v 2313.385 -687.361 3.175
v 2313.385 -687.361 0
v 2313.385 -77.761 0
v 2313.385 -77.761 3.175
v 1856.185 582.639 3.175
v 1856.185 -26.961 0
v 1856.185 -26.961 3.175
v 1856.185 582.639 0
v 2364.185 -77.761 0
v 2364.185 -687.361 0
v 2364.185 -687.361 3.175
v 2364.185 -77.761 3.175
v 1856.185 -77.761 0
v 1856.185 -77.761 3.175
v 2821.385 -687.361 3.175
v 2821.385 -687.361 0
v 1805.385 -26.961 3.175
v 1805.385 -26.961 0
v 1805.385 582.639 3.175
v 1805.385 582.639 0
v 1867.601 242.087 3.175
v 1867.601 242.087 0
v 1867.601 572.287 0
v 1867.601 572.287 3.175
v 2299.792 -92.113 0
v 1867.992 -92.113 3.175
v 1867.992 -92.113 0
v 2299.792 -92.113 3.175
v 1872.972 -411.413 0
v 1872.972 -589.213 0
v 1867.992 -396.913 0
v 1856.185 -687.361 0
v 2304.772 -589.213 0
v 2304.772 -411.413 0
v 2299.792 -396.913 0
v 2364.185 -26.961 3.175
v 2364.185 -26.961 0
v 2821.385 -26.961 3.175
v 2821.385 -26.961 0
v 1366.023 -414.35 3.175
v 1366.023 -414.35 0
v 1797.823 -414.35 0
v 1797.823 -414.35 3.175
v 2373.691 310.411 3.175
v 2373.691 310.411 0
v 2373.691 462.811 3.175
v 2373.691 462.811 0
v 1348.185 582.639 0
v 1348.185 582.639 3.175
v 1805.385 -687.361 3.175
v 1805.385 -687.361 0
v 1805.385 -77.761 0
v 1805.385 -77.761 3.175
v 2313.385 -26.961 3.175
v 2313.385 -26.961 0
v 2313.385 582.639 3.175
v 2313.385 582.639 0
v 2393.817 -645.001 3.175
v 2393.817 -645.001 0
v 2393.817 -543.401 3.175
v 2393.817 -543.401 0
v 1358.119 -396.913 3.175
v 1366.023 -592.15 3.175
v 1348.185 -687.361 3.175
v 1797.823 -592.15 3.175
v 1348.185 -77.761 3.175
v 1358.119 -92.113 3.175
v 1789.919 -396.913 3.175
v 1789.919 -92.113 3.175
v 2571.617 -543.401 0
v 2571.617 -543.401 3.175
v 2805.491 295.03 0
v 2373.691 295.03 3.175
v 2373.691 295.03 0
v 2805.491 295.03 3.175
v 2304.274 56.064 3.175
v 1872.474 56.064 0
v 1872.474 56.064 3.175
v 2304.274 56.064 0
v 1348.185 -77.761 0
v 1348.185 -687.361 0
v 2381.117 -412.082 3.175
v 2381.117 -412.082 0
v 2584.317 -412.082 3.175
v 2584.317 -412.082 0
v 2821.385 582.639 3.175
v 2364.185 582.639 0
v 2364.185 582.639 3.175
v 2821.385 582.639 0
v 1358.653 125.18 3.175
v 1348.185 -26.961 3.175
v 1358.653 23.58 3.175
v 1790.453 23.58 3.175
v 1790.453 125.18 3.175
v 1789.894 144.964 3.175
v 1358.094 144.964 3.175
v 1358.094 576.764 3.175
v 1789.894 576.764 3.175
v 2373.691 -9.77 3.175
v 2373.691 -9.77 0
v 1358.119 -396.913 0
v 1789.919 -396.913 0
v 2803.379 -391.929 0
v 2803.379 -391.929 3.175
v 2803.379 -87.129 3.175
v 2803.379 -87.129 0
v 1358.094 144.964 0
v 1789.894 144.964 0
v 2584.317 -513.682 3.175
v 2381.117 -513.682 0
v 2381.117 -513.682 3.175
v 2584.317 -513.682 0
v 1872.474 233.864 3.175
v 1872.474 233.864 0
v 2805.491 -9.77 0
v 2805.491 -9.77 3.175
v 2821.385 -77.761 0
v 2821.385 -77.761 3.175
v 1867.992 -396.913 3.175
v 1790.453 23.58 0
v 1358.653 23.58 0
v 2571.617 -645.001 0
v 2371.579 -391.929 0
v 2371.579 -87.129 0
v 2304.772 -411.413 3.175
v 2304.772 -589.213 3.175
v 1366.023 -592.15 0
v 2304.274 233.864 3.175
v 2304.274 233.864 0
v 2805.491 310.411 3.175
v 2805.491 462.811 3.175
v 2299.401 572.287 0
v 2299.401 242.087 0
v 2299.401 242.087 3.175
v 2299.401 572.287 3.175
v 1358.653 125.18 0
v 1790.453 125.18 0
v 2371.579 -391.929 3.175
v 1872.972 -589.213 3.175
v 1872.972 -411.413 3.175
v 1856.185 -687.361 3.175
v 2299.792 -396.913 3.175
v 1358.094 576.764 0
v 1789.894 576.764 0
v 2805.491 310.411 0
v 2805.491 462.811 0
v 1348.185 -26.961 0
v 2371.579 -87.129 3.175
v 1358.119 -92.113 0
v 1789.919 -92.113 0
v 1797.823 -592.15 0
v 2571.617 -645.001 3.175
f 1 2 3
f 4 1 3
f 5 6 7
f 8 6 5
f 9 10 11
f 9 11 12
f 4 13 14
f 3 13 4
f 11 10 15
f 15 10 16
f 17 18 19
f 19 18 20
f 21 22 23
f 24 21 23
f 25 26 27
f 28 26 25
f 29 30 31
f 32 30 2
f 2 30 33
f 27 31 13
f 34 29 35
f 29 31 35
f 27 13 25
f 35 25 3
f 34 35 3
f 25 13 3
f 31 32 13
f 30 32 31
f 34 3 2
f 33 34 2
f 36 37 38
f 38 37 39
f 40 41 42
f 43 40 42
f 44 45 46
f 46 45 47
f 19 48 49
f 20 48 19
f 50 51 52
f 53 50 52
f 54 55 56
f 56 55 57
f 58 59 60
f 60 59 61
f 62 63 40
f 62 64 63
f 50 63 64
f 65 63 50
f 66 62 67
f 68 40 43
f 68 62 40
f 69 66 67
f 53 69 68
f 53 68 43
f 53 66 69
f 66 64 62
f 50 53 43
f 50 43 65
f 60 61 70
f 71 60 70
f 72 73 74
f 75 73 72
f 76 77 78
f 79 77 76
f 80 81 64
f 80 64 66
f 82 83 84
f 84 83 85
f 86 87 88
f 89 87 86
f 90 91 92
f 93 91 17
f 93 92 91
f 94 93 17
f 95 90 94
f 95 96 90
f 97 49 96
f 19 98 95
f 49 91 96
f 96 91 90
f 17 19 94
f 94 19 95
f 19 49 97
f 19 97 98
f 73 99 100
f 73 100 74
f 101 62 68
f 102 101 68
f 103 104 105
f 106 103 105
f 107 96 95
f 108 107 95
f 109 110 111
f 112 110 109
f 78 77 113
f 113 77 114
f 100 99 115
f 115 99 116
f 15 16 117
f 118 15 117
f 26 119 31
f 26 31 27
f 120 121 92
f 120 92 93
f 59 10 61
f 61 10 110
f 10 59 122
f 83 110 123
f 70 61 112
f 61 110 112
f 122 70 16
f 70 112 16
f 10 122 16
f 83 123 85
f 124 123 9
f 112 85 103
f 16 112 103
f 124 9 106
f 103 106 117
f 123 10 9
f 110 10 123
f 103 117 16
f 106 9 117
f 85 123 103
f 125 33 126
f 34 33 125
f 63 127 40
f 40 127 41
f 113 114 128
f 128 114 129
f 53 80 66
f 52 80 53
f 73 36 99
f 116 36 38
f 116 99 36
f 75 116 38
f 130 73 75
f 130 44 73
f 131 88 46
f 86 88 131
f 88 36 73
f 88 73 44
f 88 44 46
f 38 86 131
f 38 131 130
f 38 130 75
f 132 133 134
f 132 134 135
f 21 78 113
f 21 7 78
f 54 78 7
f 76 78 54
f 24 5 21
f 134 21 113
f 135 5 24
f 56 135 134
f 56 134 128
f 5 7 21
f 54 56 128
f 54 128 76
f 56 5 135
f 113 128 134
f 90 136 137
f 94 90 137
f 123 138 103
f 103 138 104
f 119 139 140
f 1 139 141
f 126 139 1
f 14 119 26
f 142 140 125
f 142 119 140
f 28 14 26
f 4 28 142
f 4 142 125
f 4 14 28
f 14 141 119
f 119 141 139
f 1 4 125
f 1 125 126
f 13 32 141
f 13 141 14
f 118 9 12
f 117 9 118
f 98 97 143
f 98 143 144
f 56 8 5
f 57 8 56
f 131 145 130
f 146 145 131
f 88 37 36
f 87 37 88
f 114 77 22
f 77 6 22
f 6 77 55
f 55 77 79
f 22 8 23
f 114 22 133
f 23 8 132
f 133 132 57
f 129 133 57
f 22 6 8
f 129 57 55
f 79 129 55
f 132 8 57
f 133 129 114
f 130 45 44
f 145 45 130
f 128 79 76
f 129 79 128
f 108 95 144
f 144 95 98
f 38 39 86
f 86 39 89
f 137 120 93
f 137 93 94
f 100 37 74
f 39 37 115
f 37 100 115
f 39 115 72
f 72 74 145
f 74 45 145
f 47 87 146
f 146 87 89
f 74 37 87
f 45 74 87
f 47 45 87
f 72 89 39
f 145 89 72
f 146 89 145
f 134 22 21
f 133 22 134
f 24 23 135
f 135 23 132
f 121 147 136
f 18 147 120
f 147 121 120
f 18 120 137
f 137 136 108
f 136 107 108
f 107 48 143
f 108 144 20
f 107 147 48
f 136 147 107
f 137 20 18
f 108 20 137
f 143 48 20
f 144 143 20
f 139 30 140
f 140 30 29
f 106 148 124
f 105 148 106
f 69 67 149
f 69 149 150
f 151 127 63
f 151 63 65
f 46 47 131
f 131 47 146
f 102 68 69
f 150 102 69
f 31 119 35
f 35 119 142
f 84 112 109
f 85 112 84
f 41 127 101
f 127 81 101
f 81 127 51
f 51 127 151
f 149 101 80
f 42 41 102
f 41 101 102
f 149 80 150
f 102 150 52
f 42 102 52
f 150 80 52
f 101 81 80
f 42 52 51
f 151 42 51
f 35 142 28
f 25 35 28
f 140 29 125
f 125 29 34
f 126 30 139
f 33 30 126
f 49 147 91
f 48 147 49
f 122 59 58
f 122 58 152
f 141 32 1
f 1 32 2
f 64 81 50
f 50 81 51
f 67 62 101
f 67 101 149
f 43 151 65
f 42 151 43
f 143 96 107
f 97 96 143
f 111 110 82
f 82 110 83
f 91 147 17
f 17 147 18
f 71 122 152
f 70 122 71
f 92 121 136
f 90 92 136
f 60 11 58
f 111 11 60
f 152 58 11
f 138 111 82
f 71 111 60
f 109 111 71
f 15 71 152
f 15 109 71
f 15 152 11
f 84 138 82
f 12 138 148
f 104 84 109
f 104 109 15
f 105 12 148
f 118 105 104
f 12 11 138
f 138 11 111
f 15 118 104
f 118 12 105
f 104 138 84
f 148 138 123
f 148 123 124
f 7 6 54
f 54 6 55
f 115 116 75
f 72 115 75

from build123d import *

# Parameters (mm, degrees)
SKETCH11_W                  = 457.2
SKETCH11_H                  = 609.6
BOSS_EXTRUDE1_DEPTH         = 3.175
BOSS_EXTRUDE1_2_DEPTH       = 3.175
BOSS_EXTRUDE1_3_DEPTH       = 3.175
BOSS_EXTRUDE1_4_DEPTH       = 3.175
BOSS_EXTRUDE1_5_DEPTH       = 3.175
BOSS_EXTRUDE1_6_DEPTH       = 3.175
FOLDER_INTER_WALLS_17X12_W  = 431.8
FOLDER_INTER_WALLS_17X12_H  = 304.8
CUT_EXTRUDE2_DEPTH          = 4.175
CUT_EXTRUDE2_DEPTH_BACK     = 1
BASE_PLATE_17X17_W          = 431.8
BASE_PLATE_17X17_H          = 431.8
CUT_EXTRUDE3_DEPTH          = 1
CUT_EXTRUDE3_DEPTH_BACK     = 4.175
TOP_BASE_LAYER_17X13_W      = 431.8
TOP_BASE_LAYER_17X13_H      = 330.2
CUT_EXTRUDE4_DEPTH          = 4.175
CUT_EXTRUDE4_DEPTH_BACK     = 1
BACK_WALL_17X4_W            = 431.8
BACK_WALL_17X4_H            = 101.6
CUT_EXTRUDE5_DEPTH          = 4.175
CUT_EXTRUDE5_DEPTH_BACK     = 1
ANGLED_FOLDER_WALL_2_17X7_W = 431.8
ANGLED_FOLDER_WALL_2_17X7_H = 177.8
CUT_EXTRUDE6_DEPTH          = 4.175
CUT_EXTRUDE6_DEPTH_BACK     = 1
FRONT_WALL_17X6_W           = 431.8
FRONT_WALL_17X6_H           = 152.4
CUT_EXTRUDE7_DEPTH          = 4.175
CUT_EXTRUDE7_DEPTH_BACK     = 1
LEFT_WALL_16X8_W            = 431.8
LEFT_WALL_16X8_H            = 177.8
CUT_EXTRUDE8_DEPTH          = 4.175
CUT_EXTRUDE8_DEPTH_BACK     = 1
RIGHT_WALL_12X8_W           = 431.8
RIGHT_WALL_12X8_H           = 177.8
CUT_EXTRUDE9_DEPTH          = 4.175
CUT_EXTRUDE9_DEPTH_BACK     = 1
ANGLED_FOLDER_WALL_3_8X4_W  = 203.2
ANGLED_FOLDER_WALL_3_8X4_H  = 101.6
CUT_EXTRUDE10_DEPTH         = 4.175
CUT_EXTRUDE10_DEPTH_BACK    = 1
ANGLED_FOLDER_WALL_1_7X4_W  = 177.8
ANGLED_FOLDER_WALL_1_7X4_H  = 101.6
CUT_EXTRUDE11_DEPTH         = 4.175
CUT_EXTRUDE11_DEPTH_BACK    = 1


with BuildPart() as part:
    # Sketch11 → Boss-Extrude1 (new body)
    with BuildSketch(Plane.XY):
        with Locations((2084.784911615, 277.838906703)):
            Rectangle(SKETCH11_W, SKETCH11_H)
    extrude(amount=BOSS_EXTRUDE1_DEPTH)

    # Top Base Layer, 17x13 → Cut-Extrude4 (cut, two sides)
    with BuildSketch(Plane.XY) as cut_extrude4_sk:
        with Locations((2083.501187973, 407.186637429)):
            Rectangle(TOP_BASE_LAYER_17X13_W, TOP_BASE_LAYER_17X13_H)
    extrude(amount=CUT_EXTRUDE4_DEPTH, mode=Mode.SUBTRACT)
    extrude(cut_extrude4_sk.sketch, amount=-CUT_EXTRUDE4_DEPTH_BACK, mode=Mode.SUBTRACT)

    # Angled Folder Wall 2, 17x7 → Cut-Extrude6 (cut, two sides)
    with BuildSketch(Plane.XY) as cut_extrude6_sk:
        with Locations((2088.373542002, 144.96438064)):
            Rectangle(ANGLED_FOLDER_WALL_2_17X7_W, ANGLED_FOLDER_WALL_2_17X7_H)
    extrude(amount=CUT_EXTRUDE6_DEPTH, mode=Mode.SUBTRACT)
    extrude(cut_extrude6_sk.sketch, amount=-CUT_EXTRUDE6_DEPTH_BACK, mode=Mode.SUBTRACT)


with BuildPart() as body_2:
    # Sketch11 → Boss-Extrude1 2 (new body)
    with BuildSketch(Plane.XY):
        with Locations((1576.784911615, 277.838906703)):
            Rectangle(SKETCH11_W, SKETCH11_H)
    extrude(amount=BOSS_EXTRUDE1_2_DEPTH)

    # Base Plate, 17x17 → Cut-Extrude3 (cut, two sides)
    with BuildSketch(Plane.XY.offset(3.175)) as cut_extrude3_sk:
        with Locations((1573.993628053, 360.86438064)):
            Rectangle(BASE_PLATE_17X17_W, BASE_PLATE_17X17_H)
    extrude(amount=CUT_EXTRUDE3_DEPTH, mode=Mode.SUBTRACT)
    extrude(cut_extrude3_sk.sketch, amount=-CUT_EXTRUDE3_DEPTH_BACK, mode=Mode.SUBTRACT)

    # Back Wall, 17x4 → Cut-Extrude5 (cut, two sides)
    with BuildSketch(Plane.XY) as cut_extrude5_sk:
        with Locations((1574.552650393, 74.379666893)):
            Rectangle(BACK_WALL_17X4_W, BACK_WALL_17X4_H)
    extrude(amount=CUT_EXTRUDE5_DEPTH, mode=Mode.SUBTRACT)
    extrude(cut_extrude5_sk.sketch, amount=-CUT_EXTRUDE5_DEPTH_BACK, mode=Mode.SUBTRACT)


with BuildPart() as body_3:
    # Sketch11 → Boss-Extrude1 3 (new body)
    with BuildSketch(Plane.XY):
        with Locations((2592.784911615, 277.838906703)):
            Rectangle(SKETCH11_W, SKETCH11_H)
    extrude(amount=BOSS_EXTRUDE1_3_DEPTH)


with BuildPart() as body_4:
    # Sketch11 → Boss-Extrude1 4 (new body)
    with BuildSketch(Plane.XY):
        with Locations((2084.784911615, -382.561093297)):
            Rectangle(SKETCH11_W, SKETCH11_H)
    extrude(amount=BOSS_EXTRUDE1_4_DEPTH)


with BuildPart() as body_5:
    # Sketch11 → Boss-Extrude1 5 (new body)
    with BuildSketch(Plane.XY):
        with Locations((2592.784911615, -382.561093297)):
            Rectangle(SKETCH11_W, SKETCH11_H)
    extrude(amount=BOSS_EXTRUDE1_5_DEPTH)


with BuildPart() as body_6:
    # Sketch11 → Boss-Extrude1 6 (new body)
    with BuildSketch(Plane.XY):
        with Locations((1576.784911615, -382.561093297)):
            Rectangle(SKETCH11_W, SKETCH11_H)
    extrude(amount=BOSS_EXTRUDE1_6_DEPTH)


with BuildPart() as cut_extrude2_tool:
    # Folder Inter Walls, 17x12 → Cut-Extrude2 (new body, two sides)
    with BuildSketch(Plane.XY) as cut_extrude2_sk:
        with Locations((2587.479266915, -239.528871664)):
            Rectangle(FOLDER_INTER_WALLS_17X12_W, FOLDER_INTER_WALLS_17X12_H)
        with Locations((2589.59064321, 142.630237721)):
            Rectangle(FOLDER_INTER_WALLS_17X12_W, FOLDER_INTER_WALLS_17X12_H)
        with Locations((1574.01864534, -244.513437782)):
            Rectangle(FOLDER_INTER_WALLS_17X12_W, FOLDER_INTER_WALLS_17X12_H)
        with Locations((2083.892472887, -244.513437782)):
            Rectangle(FOLDER_INTER_WALLS_17X12_W, FOLDER_INTER_WALLS_17X12_H)
    extrude(amount=CUT_EXTRUDE2_DEPTH)
    extrude(cut_extrude2_sk.sketch, amount=-CUT_EXTRUDE2_DEPTH_BACK)


with BuildPart() as body_3_1:
    add(body_3.part)

    # Cut-Extrude2: cut by cut_extrude2_tool
    add(cut_extrude2_tool.part, mode=Mode.SUBTRACT)

    # Front Wall, 17x6 → Cut-Extrude7 (cut, two sides)
    with BuildSketch(Plane.XY) as cut_extrude7_sk:
        with Locations((2589.59064321, 386.611241092)):
            Rectangle(FRONT_WALL_17X6_W, FRONT_WALL_17X6_H)
    extrude(amount=CUT_EXTRUDE7_DEPTH, mode=Mode.SUBTRACT)
    extrude(cut_extrude7_sk.sketch, amount=-CUT_EXTRUDE7_DEPTH_BACK, mode=Mode.SUBTRACT)


with BuildPart() as body_4_1:
    add(body_4.part)

    # Cut-Extrude2: cut by cut_extrude2_tool
    add(cut_extrude2_tool.part, mode=Mode.SUBTRACT)

    # Right wall, 12x8 → Cut-Extrude9 (cut, two sides)
    with BuildSketch(Plane.XY) as cut_extrude9_sk:
        with Locations((2088.87186834, -500.312959525)):
            Rectangle(RIGHT_WALL_12X8_W, RIGHT_WALL_12X8_H)
    extrude(amount=CUT_EXTRUDE9_DEPTH, mode=Mode.SUBTRACT)
    extrude(cut_extrude9_sk.sketch, amount=-CUT_EXTRUDE9_DEPTH_BACK, mode=Mode.SUBTRACT)


with BuildPart() as body_5_1:
    add(body_5.part)

    # Cut-Extrude2: cut by cut_extrude2_tool
    add(cut_extrude2_tool.part, mode=Mode.SUBTRACT)

    # Angled Folder Wall 3, 8x4 → Cut-Extrude10 (cut, two sides)
    with BuildSketch(Plane.XY) as cut_extrude10_sk:
        with Locations((2482.71694262, -462.882476624)):
            Rectangle(ANGLED_FOLDER_WALL_3_8X4_W, ANGLED_FOLDER_WALL_3_8X4_H)
    extrude(amount=CUT_EXTRUDE10_DEPTH, mode=Mode.SUBTRACT)
    extrude(cut_extrude10_sk.sketch, amount=-CUT_EXTRUDE10_DEPTH_BACK, mode=Mode.SUBTRACT)

    # Angled folder wall 1, 7x4 → Cut-Extrude11 (cut, two sides)
    with BuildSketch(Plane.XY) as cut_extrude11_sk:
        with Locations((2482.71694262, -594.201232774)):
            Rectangle(ANGLED_FOLDER_WALL_1_7X4_W, ANGLED_FOLDER_WALL_1_7X4_H)
    extrude(amount=CUT_EXTRUDE11_DEPTH, mode=Mode.SUBTRACT)
    extrude(cut_extrude11_sk.sketch, amount=-CUT_EXTRUDE11_DEPTH_BACK, mode=Mode.SUBTRACT)


with BuildPart() as body_6_1:
    add(body_6.part)

    # Cut-Extrude2: cut by cut_extrude2_tool
    add(cut_extrude2_tool.part, mode=Mode.SUBTRACT)

    # Left Wall, 16x8 → Cut-Extrude8 (cut, two sides)
    with BuildSketch(Plane.XY) as cut_extrude8_sk:
        with Locations((1581.923382741, -503.25007721)):
            Rectangle(LEFT_WALL_16X8_W, LEFT_WALL_16X8_H)
    extrude(amount=CUT_EXTRUDE8_DEPTH, mode=Mode.SUBTRACT)
    extrude(cut_extrude8_sk.sketch, amount=-CUT_EXTRUDE8_DEPTH_BACK, mode=Mode.SUBTRACT)


solid = Compound([part.part, body_2.part, body_3_1.part, body_4_1.part, body_5_1.part, body_6_1.part])
